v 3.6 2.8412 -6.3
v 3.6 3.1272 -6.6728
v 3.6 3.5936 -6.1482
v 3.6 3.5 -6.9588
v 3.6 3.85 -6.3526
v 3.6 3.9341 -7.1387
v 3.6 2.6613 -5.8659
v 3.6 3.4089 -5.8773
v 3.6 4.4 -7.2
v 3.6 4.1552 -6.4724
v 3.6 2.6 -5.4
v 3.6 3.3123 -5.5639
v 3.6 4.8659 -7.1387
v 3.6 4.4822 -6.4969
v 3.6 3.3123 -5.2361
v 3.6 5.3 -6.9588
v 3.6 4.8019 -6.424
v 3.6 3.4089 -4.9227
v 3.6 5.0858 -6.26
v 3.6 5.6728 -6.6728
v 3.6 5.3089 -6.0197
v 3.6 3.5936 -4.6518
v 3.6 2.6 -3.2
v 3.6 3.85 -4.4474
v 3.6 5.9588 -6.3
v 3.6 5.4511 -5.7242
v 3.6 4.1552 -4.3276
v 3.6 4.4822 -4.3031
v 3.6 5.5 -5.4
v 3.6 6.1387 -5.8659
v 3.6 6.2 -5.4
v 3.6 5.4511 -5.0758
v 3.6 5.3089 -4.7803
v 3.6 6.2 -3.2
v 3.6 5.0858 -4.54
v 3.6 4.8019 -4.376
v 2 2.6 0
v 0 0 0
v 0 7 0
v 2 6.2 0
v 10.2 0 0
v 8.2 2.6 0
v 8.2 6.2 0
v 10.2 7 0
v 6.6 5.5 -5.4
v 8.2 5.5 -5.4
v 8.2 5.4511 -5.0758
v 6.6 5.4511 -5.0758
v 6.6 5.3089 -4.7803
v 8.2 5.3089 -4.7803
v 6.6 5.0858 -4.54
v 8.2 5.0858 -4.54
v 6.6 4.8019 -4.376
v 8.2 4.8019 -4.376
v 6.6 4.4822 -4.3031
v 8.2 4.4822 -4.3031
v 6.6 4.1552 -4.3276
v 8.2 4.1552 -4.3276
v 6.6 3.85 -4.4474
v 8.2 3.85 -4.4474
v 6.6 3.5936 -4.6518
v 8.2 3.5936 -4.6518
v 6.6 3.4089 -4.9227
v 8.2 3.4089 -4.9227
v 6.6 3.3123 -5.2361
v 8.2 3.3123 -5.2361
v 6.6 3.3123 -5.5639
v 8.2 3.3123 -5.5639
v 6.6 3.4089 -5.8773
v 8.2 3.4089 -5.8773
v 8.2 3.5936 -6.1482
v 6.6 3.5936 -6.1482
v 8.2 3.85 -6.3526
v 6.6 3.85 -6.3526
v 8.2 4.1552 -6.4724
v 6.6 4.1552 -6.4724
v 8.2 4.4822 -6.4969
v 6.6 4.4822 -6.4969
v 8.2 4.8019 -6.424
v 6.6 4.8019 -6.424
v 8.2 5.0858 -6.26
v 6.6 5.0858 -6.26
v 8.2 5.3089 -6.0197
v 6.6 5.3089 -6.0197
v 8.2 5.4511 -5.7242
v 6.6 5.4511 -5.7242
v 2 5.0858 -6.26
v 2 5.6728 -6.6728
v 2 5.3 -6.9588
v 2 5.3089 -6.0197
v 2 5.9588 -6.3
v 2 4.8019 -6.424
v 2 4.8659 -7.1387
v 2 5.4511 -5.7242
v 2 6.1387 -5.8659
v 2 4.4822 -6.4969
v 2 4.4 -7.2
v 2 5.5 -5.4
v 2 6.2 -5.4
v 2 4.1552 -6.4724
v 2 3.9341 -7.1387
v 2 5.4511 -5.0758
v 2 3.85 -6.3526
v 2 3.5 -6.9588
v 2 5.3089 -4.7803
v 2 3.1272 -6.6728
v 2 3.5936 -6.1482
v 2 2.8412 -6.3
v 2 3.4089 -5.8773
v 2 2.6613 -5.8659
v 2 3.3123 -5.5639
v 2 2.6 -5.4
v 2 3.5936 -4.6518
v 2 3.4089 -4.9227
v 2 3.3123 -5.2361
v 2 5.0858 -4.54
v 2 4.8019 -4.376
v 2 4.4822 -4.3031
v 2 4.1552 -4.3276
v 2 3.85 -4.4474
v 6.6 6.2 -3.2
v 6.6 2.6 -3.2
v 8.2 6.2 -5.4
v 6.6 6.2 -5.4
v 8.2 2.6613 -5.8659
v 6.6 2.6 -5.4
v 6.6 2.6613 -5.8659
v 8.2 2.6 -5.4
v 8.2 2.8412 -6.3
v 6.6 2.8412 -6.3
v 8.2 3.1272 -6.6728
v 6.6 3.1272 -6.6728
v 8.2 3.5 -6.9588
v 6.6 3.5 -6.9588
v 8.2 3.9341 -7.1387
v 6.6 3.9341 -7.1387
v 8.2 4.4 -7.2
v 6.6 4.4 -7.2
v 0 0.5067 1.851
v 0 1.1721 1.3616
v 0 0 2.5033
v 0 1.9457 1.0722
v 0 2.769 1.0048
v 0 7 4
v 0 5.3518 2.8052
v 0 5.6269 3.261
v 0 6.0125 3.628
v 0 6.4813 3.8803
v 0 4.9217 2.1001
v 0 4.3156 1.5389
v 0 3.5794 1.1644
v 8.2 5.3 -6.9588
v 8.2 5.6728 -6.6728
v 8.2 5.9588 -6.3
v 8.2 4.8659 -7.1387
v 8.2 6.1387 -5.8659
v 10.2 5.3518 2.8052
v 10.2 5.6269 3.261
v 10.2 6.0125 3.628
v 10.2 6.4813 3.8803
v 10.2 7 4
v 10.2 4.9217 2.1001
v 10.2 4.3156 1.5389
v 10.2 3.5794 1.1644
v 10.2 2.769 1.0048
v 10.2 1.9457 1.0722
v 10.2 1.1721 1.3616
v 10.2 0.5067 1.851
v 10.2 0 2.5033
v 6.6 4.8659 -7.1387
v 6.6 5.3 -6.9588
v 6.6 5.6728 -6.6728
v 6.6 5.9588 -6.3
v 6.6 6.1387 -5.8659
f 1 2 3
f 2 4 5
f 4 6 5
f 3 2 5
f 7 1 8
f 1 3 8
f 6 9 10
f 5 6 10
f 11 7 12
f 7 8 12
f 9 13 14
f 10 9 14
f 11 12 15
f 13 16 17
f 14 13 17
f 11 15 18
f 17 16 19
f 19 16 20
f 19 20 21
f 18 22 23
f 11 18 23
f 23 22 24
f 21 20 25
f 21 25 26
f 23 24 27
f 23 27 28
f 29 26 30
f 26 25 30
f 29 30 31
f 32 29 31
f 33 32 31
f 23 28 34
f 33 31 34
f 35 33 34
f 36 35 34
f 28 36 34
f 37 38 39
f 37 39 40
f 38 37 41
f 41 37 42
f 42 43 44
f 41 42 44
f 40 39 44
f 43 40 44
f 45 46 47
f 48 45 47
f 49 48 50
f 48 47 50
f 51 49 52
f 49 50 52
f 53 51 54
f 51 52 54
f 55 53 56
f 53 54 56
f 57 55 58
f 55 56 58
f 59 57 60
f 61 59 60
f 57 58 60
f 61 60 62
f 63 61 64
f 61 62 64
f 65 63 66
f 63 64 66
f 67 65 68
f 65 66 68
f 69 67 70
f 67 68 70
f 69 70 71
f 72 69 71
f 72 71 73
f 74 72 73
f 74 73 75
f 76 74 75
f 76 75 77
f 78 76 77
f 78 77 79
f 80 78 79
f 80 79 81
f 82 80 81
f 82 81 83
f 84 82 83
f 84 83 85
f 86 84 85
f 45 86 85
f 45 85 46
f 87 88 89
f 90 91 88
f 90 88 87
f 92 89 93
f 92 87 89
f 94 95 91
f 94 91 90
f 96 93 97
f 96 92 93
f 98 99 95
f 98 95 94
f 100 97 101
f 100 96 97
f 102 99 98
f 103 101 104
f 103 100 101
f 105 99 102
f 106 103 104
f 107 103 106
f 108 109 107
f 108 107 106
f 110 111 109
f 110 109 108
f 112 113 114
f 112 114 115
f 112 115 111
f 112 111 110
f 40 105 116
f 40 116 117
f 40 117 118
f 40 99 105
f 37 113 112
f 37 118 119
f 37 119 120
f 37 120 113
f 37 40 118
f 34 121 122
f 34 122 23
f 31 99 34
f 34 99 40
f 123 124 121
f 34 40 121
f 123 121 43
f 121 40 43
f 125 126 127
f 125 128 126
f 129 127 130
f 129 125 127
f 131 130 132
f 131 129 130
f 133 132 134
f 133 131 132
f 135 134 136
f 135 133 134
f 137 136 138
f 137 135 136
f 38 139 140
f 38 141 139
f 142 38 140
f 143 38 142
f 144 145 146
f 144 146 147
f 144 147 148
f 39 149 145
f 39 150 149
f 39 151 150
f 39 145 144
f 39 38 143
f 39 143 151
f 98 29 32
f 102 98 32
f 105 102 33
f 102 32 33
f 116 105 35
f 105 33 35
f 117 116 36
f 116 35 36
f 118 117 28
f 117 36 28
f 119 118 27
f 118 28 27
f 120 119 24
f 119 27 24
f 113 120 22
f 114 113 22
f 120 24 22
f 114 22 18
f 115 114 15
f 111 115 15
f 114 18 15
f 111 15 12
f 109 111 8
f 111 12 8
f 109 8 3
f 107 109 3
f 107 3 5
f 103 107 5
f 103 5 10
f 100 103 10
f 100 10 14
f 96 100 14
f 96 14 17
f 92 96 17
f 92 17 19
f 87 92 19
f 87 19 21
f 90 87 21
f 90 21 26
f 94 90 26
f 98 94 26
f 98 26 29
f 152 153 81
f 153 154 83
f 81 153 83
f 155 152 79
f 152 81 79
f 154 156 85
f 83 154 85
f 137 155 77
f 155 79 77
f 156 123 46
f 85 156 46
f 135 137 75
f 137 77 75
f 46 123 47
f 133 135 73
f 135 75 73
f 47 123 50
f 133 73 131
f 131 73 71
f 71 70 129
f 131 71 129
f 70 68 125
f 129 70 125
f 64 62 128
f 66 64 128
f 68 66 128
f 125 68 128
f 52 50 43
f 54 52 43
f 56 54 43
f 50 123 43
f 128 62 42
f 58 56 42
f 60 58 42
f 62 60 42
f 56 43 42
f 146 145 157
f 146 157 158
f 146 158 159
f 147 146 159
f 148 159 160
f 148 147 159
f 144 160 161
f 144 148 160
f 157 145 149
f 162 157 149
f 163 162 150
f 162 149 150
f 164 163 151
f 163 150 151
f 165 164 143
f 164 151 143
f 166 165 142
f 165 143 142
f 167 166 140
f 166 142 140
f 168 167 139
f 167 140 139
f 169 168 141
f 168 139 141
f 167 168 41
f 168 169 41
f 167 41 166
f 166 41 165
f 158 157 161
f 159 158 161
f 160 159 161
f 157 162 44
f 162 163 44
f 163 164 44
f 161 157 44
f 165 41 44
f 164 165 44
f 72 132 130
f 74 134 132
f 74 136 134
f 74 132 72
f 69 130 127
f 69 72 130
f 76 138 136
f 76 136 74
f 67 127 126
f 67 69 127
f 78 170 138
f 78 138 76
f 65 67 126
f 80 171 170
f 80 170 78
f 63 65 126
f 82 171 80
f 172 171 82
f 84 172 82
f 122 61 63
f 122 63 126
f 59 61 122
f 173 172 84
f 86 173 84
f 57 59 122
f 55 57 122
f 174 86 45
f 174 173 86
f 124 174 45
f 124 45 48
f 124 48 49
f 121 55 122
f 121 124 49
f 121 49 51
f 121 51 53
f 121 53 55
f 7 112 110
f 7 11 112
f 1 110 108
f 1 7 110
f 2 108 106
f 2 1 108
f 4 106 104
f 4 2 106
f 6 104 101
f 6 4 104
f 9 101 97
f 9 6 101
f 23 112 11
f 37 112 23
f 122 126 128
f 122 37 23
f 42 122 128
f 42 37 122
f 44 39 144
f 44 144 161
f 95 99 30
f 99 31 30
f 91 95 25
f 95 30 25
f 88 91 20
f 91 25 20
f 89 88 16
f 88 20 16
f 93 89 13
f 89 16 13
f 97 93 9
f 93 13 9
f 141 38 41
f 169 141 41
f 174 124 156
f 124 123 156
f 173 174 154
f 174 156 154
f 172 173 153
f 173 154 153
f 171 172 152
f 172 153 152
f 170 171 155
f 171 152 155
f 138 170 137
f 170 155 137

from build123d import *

# Parameters (mm, degrees)
F0_W         = 10.2
F0_H         = 7
F1_DEPTH     = 4
F2_W         = 6.2
F2_H         = 3.6
F3_DEPTH     = 7.2
F4_W         = 3
F4_H         = 4
F5_DEPTH     = 25
F6_R         = 1.79999
F7_R         = 1.1
F8_DEPTH     = 25
F9_R         = 3
F10_DEPTH    = 25
F11_T1_DEPTH = 17.2


# Not quite as in the source:
# - a fillet or chamfer that OpenCascade refuses, or shapes differently, is made with other operations: its cross-section is extruded or revolved along the edge and cut away or added
# - a fillet or chamfer is up to 0.001 mm smaller than in the source, because OpenCascade refuses the exact size


with BuildPart() as f1:
    # F0 (on Top) → F1 (new body)
    with BuildSketch(Plane.XY):
        with Locations((5.1, 3.5)):
            Rectangle(F0_W, F0_H)
    extrude(amount=F1_DEPTH)

    # F2 (on face) → F3 (join)
    with BuildSketch(Plane(origin=(0, 0, 0), x_dir=(1, 0, 0), z_dir=(0, 0, -1))):
        with Locations((5.1, -4.4)):
            Rectangle(F2_W, F2_H)
    extrude(amount=F3_DEPTH)

    # F4 (on face) → F5 (cut)
    with BuildSketch(Plane(origin=(0, 6.2, 0), x_dir=(-1, 0, 0), z_dir=(0, 1, 0))):
        with Locations((-5.1, -5.2)):
            Rectangle(F4_W, F4_H)
    extrude(amount=-F5_DEPTH, mode=Mode.SUBTRACT)

    # F6 (radius 1.8 in the source; OpenCascade refuses exactly that, so slightly less here)
    f6_edges = [f1.edges().sort_by_distance(p)[0] for p in [
        (2.8, 2.6, -7.2),
        (7.4, 2.6, -7.2),
        (2.8, 6.2, -7.2),
        (7.4, 6.2, -7.2),
    ]]
    fillet(f6_edges, radius=F6_R)

    # F7 (on face) → F8 (cut)
    with BuildSketch(Plane.YZ.offset(8.2)):
        with Locations((4.4, -5.4)):
            Circle(F7_R)
    extrude(amount=-F8_DEPTH, mode=Mode.SUBTRACT)

    # F9 (on face) → F10 (cut)
    with BuildSketch(Plane(origin=(0, 0, 0), x_dir=(0, -1, 0), z_dir=(-1, 0, 0))):
        with Locations((-2.6, 4)):
            Circle(F9_R)
    extrude(amount=-F10_DEPTH, mode=Mode.SUBTRACT)

    # F11: fillet of radius 2 on 1 edges, made by hand

    # F11_s2 → F11_t1 (cut)
    with BuildSketch(Plane.YZ.offset(-3.5)):
        with BuildLine():
            ThreePointArc((5.3518181818, 2.8052210689), (6.0125269518, 3.627994046), (7, 4))
            Line((7, 4), (5.6, 4))
            ThreePointArc((5.6, 4), (5.5372993162, 3.3898584367), (5.3518181818, 2.8052210689))
        make_face()
    extrude(amount=F11_T1_DEPTH, mode=Mode.SUBTRACT)


solid = f1.part
